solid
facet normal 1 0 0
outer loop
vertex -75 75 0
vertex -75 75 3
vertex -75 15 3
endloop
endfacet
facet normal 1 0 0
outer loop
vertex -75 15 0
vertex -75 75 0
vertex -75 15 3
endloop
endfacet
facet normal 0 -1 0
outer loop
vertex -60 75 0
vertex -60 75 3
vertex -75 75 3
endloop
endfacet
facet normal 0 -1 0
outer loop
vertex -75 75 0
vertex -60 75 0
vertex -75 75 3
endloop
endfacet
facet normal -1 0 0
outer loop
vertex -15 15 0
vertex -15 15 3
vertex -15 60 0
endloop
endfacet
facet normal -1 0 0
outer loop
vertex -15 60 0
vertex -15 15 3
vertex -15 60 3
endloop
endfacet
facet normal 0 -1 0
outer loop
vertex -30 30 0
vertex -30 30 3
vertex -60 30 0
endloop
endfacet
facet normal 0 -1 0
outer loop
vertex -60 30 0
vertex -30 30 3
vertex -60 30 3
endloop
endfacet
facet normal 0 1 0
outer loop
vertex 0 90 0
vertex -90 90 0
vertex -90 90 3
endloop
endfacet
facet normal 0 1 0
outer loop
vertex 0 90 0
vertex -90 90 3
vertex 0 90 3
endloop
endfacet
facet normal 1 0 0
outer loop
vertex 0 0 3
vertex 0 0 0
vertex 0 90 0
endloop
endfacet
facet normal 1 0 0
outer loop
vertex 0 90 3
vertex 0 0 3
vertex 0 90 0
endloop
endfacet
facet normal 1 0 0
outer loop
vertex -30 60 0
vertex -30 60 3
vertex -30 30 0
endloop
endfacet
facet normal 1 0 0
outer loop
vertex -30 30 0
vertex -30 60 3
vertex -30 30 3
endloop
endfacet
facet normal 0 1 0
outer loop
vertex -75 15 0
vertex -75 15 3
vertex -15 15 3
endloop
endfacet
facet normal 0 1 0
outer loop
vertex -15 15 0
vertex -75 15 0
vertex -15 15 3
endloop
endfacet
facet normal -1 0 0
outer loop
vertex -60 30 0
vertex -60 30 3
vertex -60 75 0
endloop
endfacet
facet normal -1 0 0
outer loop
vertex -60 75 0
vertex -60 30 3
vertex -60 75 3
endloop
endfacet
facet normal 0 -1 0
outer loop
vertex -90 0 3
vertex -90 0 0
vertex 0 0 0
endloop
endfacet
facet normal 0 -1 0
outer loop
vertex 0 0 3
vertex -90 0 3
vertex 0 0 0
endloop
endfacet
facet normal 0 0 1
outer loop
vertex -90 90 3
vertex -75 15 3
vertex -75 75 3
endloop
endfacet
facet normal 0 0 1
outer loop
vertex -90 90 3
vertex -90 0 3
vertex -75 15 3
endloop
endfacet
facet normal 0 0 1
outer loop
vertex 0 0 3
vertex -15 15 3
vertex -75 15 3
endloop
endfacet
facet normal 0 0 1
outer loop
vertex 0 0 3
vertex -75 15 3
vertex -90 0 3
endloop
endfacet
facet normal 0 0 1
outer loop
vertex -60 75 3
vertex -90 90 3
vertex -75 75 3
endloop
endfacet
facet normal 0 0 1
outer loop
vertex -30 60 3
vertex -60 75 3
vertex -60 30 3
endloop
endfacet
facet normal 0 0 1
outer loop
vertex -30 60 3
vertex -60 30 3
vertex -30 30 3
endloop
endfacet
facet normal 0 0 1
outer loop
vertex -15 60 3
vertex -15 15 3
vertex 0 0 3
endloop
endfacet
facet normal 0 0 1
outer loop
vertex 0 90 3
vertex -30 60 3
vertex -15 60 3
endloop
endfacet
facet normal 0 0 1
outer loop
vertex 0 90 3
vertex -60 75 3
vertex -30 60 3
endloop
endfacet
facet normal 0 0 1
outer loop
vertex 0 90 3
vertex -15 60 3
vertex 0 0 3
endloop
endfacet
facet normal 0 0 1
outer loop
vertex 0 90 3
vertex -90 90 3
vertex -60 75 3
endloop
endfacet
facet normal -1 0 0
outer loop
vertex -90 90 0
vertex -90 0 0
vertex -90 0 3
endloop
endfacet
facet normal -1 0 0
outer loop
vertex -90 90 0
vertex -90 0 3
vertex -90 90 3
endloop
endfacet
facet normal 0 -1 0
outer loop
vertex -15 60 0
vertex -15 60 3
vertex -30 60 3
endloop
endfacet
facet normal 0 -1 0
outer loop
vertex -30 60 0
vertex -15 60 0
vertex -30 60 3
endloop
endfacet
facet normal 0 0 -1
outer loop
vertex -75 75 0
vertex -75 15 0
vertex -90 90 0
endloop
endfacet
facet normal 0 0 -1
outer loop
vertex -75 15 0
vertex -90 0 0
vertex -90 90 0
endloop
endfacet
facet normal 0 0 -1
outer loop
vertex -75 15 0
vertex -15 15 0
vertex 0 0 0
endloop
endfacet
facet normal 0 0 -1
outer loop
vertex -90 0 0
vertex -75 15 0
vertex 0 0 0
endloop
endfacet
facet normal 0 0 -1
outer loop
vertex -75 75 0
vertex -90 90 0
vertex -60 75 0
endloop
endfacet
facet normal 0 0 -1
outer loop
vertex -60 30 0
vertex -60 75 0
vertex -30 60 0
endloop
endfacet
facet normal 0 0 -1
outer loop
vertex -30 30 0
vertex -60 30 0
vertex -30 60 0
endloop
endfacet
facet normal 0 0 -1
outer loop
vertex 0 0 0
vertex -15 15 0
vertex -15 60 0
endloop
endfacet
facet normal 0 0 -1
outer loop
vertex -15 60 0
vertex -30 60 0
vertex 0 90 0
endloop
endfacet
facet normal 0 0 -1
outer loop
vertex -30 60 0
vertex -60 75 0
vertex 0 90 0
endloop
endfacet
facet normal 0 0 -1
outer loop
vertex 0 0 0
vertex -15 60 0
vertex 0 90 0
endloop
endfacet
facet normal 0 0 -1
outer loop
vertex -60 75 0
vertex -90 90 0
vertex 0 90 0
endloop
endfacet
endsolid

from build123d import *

# Parameters (mm, degrees)
SKETCH_W     = 90
SKETCH_H     = 90
PAD_DEPTH    = 3
POCKET_DEPTH = 3


with BuildPart() as part:
    # Sketch → Pad (new body)
    with BuildSketch(Plane.XY):
        with Locations((-45, 45)):
            Rectangle(SKETCH_W, SKETCH_H)
    extrude(amount=PAD_DEPTH)

    # Sketch001 (on Face6 of Pad) → Pocket (cut)
    with BuildSketch(Plane.XY.offset(3)):
        Polygon((-75, 75), (-75, 15), (-15, 15), (-15, 60), (-30, 60), (-30, 30), (-60, 30), (-60, 75), align=None)
    extrude(amount=-POCKET_DEPTH, mode=Mode.SUBTRACT)


solid = part.part
